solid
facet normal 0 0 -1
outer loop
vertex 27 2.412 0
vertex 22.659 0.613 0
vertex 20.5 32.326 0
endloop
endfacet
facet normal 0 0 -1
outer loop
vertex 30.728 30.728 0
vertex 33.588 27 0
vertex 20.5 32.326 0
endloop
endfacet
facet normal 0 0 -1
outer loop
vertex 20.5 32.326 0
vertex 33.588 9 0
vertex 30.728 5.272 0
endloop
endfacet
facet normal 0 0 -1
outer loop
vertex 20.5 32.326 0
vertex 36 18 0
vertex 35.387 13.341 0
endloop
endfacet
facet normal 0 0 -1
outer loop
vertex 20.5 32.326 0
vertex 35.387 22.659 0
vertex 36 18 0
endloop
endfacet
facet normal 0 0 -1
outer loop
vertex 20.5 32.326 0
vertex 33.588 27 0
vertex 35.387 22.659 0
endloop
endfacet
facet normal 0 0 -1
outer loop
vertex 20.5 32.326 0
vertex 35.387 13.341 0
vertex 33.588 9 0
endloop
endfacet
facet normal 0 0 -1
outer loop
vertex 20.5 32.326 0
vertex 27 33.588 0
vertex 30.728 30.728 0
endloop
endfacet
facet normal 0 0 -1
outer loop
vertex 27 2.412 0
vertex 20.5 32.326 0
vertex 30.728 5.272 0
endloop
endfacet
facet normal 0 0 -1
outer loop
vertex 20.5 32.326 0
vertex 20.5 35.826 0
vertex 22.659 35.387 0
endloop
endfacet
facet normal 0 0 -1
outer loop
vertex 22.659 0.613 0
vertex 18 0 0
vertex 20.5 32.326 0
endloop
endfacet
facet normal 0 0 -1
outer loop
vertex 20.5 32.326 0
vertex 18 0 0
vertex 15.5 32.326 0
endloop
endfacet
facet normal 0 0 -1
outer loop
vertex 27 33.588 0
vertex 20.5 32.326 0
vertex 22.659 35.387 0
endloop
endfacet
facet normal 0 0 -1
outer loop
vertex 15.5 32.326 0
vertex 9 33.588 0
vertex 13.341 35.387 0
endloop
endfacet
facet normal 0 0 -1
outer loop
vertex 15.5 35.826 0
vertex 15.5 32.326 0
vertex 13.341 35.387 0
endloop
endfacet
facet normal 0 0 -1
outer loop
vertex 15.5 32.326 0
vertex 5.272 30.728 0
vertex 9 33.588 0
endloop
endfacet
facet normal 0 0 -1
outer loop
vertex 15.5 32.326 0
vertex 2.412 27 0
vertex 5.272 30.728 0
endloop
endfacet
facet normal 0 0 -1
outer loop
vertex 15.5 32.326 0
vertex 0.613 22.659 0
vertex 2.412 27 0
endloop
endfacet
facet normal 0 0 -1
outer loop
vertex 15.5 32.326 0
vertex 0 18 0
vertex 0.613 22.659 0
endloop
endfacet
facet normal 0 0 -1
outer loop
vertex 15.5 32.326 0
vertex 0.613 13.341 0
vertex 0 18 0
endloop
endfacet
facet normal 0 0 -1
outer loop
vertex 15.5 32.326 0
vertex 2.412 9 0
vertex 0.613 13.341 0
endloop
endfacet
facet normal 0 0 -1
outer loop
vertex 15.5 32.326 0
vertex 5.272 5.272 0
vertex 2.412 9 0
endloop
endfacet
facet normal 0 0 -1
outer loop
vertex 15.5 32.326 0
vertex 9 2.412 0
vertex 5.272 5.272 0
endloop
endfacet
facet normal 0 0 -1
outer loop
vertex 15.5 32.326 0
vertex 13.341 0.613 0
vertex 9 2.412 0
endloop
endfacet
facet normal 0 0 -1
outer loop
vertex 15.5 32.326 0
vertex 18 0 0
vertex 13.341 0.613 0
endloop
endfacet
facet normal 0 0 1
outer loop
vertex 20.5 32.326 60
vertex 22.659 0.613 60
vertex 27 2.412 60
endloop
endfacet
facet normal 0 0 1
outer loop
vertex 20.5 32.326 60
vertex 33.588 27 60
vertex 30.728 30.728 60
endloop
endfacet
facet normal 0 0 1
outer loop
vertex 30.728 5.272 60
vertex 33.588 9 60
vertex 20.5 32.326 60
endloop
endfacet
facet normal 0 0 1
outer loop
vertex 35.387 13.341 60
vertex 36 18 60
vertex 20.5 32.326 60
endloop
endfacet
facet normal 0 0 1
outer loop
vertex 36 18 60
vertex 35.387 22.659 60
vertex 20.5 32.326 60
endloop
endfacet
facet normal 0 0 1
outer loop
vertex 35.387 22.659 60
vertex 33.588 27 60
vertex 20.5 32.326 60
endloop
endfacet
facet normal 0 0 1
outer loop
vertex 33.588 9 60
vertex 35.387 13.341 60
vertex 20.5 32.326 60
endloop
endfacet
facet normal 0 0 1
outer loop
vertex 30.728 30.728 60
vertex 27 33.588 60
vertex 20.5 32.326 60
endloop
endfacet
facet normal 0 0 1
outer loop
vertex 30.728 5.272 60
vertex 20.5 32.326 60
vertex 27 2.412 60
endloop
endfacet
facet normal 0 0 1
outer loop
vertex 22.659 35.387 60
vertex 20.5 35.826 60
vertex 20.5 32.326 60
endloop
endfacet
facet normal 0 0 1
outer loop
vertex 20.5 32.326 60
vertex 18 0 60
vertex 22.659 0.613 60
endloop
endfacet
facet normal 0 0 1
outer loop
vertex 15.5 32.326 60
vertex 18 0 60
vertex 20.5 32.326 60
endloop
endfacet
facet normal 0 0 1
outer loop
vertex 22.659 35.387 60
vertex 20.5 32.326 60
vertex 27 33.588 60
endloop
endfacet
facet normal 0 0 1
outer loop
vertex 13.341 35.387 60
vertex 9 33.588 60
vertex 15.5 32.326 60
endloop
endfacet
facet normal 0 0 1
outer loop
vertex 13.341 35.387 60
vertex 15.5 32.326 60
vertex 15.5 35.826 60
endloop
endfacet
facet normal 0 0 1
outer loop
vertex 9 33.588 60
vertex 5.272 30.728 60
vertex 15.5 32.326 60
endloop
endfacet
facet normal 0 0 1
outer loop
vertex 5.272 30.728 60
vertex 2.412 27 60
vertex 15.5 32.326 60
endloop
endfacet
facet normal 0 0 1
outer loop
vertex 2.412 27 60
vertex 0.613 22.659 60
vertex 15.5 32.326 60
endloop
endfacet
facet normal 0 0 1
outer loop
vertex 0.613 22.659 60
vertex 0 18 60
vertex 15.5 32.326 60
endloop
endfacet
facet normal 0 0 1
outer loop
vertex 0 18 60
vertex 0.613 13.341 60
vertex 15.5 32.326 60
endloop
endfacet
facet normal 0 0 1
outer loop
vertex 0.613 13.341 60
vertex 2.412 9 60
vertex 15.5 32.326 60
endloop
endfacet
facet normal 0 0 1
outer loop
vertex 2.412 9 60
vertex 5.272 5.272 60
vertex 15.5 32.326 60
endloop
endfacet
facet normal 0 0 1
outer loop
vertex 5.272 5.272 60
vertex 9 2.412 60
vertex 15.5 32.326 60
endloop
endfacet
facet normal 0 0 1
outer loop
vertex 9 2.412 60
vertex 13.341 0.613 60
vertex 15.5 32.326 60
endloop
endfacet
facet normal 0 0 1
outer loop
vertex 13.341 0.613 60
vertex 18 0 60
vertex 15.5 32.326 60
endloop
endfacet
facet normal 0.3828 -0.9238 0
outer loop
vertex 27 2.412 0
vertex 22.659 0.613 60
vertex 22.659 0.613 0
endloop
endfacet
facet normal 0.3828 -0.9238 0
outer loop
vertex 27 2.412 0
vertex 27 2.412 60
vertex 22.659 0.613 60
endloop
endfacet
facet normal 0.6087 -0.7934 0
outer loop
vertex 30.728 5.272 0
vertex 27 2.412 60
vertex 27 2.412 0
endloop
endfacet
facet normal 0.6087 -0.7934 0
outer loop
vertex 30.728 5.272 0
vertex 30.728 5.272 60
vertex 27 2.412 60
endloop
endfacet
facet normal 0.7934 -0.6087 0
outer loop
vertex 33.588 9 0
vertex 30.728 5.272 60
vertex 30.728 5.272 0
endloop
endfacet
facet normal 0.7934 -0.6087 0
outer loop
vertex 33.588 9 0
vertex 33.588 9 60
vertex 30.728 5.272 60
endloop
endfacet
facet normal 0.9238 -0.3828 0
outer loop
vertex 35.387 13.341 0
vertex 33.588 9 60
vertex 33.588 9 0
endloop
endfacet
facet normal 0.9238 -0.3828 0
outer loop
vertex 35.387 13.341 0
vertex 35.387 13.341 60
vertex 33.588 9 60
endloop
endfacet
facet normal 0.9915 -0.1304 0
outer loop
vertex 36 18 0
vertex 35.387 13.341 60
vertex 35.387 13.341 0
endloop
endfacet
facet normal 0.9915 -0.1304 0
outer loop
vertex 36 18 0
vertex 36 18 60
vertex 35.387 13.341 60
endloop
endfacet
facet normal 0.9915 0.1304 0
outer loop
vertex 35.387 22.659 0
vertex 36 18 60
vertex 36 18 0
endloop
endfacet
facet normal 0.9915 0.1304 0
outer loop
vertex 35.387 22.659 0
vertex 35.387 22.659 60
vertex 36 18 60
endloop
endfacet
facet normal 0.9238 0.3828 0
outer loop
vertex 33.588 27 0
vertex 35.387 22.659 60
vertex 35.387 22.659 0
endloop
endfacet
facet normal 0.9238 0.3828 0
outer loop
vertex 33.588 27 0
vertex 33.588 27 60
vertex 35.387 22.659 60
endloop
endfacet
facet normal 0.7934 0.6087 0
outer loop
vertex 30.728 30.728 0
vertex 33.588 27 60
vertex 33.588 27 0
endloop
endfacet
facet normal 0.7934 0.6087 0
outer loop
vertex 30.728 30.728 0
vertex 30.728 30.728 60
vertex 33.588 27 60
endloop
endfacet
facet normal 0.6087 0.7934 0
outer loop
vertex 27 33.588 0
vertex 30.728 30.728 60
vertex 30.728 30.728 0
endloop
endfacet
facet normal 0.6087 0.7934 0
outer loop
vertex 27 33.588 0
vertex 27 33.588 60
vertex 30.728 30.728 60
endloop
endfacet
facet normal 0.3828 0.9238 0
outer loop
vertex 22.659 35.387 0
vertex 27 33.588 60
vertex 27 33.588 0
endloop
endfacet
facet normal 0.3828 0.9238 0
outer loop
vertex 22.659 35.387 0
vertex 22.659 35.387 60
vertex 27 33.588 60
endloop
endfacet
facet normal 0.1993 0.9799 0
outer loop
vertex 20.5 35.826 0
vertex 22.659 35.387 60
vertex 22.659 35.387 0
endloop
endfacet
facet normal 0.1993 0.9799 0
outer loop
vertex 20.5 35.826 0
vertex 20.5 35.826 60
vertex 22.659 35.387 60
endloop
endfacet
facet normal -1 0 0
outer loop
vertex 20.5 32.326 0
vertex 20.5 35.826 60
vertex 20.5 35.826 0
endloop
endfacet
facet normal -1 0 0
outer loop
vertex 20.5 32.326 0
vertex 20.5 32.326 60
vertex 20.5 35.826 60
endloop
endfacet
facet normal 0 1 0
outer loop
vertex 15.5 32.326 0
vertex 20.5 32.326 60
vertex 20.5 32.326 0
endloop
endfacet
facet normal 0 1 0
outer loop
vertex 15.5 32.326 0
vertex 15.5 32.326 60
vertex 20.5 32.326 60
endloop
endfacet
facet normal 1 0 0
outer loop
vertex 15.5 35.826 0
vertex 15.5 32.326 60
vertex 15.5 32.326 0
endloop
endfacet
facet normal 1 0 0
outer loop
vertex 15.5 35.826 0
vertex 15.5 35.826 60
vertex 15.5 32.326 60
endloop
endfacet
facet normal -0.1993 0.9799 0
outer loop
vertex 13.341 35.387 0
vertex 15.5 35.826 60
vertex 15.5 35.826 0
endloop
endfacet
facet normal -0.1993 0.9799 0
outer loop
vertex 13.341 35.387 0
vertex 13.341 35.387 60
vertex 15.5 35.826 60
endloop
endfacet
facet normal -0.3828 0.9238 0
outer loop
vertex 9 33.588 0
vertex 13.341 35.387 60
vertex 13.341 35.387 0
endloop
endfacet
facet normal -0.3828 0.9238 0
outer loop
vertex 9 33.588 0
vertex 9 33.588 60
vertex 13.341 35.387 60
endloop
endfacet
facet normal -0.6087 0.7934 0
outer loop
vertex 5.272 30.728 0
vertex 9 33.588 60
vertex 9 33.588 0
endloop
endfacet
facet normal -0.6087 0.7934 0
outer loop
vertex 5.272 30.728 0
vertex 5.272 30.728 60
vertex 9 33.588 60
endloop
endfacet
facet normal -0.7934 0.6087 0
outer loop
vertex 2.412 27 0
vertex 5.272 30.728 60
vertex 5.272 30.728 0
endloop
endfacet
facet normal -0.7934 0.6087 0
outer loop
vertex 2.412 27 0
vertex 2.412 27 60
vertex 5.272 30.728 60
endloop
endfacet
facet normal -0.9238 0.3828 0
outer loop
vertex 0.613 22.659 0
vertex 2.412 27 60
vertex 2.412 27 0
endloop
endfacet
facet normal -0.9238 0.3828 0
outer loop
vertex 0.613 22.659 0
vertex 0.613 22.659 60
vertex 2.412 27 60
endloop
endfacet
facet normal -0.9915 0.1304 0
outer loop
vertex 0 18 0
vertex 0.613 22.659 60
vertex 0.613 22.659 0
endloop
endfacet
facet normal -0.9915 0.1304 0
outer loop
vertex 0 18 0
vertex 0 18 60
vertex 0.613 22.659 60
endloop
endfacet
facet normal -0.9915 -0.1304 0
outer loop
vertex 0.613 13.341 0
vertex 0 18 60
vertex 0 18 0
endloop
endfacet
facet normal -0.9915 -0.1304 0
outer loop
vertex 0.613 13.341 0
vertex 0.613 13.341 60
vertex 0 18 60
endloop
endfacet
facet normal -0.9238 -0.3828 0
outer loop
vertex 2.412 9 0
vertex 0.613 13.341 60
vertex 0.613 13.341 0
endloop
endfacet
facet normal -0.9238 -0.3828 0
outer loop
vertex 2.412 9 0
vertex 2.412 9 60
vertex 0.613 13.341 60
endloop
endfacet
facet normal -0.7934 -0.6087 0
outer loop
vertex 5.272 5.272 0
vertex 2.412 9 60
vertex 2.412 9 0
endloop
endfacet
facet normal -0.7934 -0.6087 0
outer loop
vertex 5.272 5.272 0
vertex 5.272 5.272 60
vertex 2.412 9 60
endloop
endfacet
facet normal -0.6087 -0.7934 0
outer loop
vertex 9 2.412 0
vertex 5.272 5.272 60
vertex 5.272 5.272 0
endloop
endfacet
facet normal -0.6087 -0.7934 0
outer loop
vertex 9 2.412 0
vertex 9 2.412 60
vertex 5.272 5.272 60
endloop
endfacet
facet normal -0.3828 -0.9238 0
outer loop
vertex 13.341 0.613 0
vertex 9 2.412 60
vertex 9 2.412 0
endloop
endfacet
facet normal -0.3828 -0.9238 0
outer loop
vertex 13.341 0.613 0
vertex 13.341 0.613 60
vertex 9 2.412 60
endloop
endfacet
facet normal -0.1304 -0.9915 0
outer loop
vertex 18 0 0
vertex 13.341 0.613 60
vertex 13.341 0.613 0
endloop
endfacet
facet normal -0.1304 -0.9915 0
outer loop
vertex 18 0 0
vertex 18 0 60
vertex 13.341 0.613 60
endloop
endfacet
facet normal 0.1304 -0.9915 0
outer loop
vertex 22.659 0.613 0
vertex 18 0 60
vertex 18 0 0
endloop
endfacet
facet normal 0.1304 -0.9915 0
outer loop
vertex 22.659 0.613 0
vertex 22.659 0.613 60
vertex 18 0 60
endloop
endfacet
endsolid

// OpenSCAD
$fn = 32;

// ----------------------------------------------------------------------
// Keyway shaft: d36 shaft, key 5 x 3.5 mm
// ----------------------------------------------------------------------

// --- parameters (mm) ---
shaft_r = 18;             // shaft radius
key_w = 5;                // keyway width
key_d = 3.5;              // keyway depth below the surface line
plate_t = 60;             // shaft length, Z (extrusion height)

shaft_d = 2 * shaft_r;  // shaft diameter
circle_step = 15;  // polygon sampling step, degrees

profile = [[13.341, 35.387], [9, 33.588], [5.272, 30.728], [2.412, 27], [0.613, 22.659], [0, 18], [0.613, 13.341], [2.412, 9], [5.272, 5.272], [9, 2.412], [13.341, 0.613], [18, 0], [22.659, 0.613], [27, 2.412], [30.728, 5.272], [33.588, 9], [35.387, 13.341], [36, 18], [35.387, 22.659], [33.588, 27], [30.728, 30.728], [27, 33.588], [22.659, 35.387], [20.5, 35.826], [20.5, 32.326], [15.5, 32.326], [15.5, 35.826]];  // primary outline, 27 points, counter clockwise

// --- the one profile operation ---
linear_extrude(height = plate_t) polygon(points = profile);
